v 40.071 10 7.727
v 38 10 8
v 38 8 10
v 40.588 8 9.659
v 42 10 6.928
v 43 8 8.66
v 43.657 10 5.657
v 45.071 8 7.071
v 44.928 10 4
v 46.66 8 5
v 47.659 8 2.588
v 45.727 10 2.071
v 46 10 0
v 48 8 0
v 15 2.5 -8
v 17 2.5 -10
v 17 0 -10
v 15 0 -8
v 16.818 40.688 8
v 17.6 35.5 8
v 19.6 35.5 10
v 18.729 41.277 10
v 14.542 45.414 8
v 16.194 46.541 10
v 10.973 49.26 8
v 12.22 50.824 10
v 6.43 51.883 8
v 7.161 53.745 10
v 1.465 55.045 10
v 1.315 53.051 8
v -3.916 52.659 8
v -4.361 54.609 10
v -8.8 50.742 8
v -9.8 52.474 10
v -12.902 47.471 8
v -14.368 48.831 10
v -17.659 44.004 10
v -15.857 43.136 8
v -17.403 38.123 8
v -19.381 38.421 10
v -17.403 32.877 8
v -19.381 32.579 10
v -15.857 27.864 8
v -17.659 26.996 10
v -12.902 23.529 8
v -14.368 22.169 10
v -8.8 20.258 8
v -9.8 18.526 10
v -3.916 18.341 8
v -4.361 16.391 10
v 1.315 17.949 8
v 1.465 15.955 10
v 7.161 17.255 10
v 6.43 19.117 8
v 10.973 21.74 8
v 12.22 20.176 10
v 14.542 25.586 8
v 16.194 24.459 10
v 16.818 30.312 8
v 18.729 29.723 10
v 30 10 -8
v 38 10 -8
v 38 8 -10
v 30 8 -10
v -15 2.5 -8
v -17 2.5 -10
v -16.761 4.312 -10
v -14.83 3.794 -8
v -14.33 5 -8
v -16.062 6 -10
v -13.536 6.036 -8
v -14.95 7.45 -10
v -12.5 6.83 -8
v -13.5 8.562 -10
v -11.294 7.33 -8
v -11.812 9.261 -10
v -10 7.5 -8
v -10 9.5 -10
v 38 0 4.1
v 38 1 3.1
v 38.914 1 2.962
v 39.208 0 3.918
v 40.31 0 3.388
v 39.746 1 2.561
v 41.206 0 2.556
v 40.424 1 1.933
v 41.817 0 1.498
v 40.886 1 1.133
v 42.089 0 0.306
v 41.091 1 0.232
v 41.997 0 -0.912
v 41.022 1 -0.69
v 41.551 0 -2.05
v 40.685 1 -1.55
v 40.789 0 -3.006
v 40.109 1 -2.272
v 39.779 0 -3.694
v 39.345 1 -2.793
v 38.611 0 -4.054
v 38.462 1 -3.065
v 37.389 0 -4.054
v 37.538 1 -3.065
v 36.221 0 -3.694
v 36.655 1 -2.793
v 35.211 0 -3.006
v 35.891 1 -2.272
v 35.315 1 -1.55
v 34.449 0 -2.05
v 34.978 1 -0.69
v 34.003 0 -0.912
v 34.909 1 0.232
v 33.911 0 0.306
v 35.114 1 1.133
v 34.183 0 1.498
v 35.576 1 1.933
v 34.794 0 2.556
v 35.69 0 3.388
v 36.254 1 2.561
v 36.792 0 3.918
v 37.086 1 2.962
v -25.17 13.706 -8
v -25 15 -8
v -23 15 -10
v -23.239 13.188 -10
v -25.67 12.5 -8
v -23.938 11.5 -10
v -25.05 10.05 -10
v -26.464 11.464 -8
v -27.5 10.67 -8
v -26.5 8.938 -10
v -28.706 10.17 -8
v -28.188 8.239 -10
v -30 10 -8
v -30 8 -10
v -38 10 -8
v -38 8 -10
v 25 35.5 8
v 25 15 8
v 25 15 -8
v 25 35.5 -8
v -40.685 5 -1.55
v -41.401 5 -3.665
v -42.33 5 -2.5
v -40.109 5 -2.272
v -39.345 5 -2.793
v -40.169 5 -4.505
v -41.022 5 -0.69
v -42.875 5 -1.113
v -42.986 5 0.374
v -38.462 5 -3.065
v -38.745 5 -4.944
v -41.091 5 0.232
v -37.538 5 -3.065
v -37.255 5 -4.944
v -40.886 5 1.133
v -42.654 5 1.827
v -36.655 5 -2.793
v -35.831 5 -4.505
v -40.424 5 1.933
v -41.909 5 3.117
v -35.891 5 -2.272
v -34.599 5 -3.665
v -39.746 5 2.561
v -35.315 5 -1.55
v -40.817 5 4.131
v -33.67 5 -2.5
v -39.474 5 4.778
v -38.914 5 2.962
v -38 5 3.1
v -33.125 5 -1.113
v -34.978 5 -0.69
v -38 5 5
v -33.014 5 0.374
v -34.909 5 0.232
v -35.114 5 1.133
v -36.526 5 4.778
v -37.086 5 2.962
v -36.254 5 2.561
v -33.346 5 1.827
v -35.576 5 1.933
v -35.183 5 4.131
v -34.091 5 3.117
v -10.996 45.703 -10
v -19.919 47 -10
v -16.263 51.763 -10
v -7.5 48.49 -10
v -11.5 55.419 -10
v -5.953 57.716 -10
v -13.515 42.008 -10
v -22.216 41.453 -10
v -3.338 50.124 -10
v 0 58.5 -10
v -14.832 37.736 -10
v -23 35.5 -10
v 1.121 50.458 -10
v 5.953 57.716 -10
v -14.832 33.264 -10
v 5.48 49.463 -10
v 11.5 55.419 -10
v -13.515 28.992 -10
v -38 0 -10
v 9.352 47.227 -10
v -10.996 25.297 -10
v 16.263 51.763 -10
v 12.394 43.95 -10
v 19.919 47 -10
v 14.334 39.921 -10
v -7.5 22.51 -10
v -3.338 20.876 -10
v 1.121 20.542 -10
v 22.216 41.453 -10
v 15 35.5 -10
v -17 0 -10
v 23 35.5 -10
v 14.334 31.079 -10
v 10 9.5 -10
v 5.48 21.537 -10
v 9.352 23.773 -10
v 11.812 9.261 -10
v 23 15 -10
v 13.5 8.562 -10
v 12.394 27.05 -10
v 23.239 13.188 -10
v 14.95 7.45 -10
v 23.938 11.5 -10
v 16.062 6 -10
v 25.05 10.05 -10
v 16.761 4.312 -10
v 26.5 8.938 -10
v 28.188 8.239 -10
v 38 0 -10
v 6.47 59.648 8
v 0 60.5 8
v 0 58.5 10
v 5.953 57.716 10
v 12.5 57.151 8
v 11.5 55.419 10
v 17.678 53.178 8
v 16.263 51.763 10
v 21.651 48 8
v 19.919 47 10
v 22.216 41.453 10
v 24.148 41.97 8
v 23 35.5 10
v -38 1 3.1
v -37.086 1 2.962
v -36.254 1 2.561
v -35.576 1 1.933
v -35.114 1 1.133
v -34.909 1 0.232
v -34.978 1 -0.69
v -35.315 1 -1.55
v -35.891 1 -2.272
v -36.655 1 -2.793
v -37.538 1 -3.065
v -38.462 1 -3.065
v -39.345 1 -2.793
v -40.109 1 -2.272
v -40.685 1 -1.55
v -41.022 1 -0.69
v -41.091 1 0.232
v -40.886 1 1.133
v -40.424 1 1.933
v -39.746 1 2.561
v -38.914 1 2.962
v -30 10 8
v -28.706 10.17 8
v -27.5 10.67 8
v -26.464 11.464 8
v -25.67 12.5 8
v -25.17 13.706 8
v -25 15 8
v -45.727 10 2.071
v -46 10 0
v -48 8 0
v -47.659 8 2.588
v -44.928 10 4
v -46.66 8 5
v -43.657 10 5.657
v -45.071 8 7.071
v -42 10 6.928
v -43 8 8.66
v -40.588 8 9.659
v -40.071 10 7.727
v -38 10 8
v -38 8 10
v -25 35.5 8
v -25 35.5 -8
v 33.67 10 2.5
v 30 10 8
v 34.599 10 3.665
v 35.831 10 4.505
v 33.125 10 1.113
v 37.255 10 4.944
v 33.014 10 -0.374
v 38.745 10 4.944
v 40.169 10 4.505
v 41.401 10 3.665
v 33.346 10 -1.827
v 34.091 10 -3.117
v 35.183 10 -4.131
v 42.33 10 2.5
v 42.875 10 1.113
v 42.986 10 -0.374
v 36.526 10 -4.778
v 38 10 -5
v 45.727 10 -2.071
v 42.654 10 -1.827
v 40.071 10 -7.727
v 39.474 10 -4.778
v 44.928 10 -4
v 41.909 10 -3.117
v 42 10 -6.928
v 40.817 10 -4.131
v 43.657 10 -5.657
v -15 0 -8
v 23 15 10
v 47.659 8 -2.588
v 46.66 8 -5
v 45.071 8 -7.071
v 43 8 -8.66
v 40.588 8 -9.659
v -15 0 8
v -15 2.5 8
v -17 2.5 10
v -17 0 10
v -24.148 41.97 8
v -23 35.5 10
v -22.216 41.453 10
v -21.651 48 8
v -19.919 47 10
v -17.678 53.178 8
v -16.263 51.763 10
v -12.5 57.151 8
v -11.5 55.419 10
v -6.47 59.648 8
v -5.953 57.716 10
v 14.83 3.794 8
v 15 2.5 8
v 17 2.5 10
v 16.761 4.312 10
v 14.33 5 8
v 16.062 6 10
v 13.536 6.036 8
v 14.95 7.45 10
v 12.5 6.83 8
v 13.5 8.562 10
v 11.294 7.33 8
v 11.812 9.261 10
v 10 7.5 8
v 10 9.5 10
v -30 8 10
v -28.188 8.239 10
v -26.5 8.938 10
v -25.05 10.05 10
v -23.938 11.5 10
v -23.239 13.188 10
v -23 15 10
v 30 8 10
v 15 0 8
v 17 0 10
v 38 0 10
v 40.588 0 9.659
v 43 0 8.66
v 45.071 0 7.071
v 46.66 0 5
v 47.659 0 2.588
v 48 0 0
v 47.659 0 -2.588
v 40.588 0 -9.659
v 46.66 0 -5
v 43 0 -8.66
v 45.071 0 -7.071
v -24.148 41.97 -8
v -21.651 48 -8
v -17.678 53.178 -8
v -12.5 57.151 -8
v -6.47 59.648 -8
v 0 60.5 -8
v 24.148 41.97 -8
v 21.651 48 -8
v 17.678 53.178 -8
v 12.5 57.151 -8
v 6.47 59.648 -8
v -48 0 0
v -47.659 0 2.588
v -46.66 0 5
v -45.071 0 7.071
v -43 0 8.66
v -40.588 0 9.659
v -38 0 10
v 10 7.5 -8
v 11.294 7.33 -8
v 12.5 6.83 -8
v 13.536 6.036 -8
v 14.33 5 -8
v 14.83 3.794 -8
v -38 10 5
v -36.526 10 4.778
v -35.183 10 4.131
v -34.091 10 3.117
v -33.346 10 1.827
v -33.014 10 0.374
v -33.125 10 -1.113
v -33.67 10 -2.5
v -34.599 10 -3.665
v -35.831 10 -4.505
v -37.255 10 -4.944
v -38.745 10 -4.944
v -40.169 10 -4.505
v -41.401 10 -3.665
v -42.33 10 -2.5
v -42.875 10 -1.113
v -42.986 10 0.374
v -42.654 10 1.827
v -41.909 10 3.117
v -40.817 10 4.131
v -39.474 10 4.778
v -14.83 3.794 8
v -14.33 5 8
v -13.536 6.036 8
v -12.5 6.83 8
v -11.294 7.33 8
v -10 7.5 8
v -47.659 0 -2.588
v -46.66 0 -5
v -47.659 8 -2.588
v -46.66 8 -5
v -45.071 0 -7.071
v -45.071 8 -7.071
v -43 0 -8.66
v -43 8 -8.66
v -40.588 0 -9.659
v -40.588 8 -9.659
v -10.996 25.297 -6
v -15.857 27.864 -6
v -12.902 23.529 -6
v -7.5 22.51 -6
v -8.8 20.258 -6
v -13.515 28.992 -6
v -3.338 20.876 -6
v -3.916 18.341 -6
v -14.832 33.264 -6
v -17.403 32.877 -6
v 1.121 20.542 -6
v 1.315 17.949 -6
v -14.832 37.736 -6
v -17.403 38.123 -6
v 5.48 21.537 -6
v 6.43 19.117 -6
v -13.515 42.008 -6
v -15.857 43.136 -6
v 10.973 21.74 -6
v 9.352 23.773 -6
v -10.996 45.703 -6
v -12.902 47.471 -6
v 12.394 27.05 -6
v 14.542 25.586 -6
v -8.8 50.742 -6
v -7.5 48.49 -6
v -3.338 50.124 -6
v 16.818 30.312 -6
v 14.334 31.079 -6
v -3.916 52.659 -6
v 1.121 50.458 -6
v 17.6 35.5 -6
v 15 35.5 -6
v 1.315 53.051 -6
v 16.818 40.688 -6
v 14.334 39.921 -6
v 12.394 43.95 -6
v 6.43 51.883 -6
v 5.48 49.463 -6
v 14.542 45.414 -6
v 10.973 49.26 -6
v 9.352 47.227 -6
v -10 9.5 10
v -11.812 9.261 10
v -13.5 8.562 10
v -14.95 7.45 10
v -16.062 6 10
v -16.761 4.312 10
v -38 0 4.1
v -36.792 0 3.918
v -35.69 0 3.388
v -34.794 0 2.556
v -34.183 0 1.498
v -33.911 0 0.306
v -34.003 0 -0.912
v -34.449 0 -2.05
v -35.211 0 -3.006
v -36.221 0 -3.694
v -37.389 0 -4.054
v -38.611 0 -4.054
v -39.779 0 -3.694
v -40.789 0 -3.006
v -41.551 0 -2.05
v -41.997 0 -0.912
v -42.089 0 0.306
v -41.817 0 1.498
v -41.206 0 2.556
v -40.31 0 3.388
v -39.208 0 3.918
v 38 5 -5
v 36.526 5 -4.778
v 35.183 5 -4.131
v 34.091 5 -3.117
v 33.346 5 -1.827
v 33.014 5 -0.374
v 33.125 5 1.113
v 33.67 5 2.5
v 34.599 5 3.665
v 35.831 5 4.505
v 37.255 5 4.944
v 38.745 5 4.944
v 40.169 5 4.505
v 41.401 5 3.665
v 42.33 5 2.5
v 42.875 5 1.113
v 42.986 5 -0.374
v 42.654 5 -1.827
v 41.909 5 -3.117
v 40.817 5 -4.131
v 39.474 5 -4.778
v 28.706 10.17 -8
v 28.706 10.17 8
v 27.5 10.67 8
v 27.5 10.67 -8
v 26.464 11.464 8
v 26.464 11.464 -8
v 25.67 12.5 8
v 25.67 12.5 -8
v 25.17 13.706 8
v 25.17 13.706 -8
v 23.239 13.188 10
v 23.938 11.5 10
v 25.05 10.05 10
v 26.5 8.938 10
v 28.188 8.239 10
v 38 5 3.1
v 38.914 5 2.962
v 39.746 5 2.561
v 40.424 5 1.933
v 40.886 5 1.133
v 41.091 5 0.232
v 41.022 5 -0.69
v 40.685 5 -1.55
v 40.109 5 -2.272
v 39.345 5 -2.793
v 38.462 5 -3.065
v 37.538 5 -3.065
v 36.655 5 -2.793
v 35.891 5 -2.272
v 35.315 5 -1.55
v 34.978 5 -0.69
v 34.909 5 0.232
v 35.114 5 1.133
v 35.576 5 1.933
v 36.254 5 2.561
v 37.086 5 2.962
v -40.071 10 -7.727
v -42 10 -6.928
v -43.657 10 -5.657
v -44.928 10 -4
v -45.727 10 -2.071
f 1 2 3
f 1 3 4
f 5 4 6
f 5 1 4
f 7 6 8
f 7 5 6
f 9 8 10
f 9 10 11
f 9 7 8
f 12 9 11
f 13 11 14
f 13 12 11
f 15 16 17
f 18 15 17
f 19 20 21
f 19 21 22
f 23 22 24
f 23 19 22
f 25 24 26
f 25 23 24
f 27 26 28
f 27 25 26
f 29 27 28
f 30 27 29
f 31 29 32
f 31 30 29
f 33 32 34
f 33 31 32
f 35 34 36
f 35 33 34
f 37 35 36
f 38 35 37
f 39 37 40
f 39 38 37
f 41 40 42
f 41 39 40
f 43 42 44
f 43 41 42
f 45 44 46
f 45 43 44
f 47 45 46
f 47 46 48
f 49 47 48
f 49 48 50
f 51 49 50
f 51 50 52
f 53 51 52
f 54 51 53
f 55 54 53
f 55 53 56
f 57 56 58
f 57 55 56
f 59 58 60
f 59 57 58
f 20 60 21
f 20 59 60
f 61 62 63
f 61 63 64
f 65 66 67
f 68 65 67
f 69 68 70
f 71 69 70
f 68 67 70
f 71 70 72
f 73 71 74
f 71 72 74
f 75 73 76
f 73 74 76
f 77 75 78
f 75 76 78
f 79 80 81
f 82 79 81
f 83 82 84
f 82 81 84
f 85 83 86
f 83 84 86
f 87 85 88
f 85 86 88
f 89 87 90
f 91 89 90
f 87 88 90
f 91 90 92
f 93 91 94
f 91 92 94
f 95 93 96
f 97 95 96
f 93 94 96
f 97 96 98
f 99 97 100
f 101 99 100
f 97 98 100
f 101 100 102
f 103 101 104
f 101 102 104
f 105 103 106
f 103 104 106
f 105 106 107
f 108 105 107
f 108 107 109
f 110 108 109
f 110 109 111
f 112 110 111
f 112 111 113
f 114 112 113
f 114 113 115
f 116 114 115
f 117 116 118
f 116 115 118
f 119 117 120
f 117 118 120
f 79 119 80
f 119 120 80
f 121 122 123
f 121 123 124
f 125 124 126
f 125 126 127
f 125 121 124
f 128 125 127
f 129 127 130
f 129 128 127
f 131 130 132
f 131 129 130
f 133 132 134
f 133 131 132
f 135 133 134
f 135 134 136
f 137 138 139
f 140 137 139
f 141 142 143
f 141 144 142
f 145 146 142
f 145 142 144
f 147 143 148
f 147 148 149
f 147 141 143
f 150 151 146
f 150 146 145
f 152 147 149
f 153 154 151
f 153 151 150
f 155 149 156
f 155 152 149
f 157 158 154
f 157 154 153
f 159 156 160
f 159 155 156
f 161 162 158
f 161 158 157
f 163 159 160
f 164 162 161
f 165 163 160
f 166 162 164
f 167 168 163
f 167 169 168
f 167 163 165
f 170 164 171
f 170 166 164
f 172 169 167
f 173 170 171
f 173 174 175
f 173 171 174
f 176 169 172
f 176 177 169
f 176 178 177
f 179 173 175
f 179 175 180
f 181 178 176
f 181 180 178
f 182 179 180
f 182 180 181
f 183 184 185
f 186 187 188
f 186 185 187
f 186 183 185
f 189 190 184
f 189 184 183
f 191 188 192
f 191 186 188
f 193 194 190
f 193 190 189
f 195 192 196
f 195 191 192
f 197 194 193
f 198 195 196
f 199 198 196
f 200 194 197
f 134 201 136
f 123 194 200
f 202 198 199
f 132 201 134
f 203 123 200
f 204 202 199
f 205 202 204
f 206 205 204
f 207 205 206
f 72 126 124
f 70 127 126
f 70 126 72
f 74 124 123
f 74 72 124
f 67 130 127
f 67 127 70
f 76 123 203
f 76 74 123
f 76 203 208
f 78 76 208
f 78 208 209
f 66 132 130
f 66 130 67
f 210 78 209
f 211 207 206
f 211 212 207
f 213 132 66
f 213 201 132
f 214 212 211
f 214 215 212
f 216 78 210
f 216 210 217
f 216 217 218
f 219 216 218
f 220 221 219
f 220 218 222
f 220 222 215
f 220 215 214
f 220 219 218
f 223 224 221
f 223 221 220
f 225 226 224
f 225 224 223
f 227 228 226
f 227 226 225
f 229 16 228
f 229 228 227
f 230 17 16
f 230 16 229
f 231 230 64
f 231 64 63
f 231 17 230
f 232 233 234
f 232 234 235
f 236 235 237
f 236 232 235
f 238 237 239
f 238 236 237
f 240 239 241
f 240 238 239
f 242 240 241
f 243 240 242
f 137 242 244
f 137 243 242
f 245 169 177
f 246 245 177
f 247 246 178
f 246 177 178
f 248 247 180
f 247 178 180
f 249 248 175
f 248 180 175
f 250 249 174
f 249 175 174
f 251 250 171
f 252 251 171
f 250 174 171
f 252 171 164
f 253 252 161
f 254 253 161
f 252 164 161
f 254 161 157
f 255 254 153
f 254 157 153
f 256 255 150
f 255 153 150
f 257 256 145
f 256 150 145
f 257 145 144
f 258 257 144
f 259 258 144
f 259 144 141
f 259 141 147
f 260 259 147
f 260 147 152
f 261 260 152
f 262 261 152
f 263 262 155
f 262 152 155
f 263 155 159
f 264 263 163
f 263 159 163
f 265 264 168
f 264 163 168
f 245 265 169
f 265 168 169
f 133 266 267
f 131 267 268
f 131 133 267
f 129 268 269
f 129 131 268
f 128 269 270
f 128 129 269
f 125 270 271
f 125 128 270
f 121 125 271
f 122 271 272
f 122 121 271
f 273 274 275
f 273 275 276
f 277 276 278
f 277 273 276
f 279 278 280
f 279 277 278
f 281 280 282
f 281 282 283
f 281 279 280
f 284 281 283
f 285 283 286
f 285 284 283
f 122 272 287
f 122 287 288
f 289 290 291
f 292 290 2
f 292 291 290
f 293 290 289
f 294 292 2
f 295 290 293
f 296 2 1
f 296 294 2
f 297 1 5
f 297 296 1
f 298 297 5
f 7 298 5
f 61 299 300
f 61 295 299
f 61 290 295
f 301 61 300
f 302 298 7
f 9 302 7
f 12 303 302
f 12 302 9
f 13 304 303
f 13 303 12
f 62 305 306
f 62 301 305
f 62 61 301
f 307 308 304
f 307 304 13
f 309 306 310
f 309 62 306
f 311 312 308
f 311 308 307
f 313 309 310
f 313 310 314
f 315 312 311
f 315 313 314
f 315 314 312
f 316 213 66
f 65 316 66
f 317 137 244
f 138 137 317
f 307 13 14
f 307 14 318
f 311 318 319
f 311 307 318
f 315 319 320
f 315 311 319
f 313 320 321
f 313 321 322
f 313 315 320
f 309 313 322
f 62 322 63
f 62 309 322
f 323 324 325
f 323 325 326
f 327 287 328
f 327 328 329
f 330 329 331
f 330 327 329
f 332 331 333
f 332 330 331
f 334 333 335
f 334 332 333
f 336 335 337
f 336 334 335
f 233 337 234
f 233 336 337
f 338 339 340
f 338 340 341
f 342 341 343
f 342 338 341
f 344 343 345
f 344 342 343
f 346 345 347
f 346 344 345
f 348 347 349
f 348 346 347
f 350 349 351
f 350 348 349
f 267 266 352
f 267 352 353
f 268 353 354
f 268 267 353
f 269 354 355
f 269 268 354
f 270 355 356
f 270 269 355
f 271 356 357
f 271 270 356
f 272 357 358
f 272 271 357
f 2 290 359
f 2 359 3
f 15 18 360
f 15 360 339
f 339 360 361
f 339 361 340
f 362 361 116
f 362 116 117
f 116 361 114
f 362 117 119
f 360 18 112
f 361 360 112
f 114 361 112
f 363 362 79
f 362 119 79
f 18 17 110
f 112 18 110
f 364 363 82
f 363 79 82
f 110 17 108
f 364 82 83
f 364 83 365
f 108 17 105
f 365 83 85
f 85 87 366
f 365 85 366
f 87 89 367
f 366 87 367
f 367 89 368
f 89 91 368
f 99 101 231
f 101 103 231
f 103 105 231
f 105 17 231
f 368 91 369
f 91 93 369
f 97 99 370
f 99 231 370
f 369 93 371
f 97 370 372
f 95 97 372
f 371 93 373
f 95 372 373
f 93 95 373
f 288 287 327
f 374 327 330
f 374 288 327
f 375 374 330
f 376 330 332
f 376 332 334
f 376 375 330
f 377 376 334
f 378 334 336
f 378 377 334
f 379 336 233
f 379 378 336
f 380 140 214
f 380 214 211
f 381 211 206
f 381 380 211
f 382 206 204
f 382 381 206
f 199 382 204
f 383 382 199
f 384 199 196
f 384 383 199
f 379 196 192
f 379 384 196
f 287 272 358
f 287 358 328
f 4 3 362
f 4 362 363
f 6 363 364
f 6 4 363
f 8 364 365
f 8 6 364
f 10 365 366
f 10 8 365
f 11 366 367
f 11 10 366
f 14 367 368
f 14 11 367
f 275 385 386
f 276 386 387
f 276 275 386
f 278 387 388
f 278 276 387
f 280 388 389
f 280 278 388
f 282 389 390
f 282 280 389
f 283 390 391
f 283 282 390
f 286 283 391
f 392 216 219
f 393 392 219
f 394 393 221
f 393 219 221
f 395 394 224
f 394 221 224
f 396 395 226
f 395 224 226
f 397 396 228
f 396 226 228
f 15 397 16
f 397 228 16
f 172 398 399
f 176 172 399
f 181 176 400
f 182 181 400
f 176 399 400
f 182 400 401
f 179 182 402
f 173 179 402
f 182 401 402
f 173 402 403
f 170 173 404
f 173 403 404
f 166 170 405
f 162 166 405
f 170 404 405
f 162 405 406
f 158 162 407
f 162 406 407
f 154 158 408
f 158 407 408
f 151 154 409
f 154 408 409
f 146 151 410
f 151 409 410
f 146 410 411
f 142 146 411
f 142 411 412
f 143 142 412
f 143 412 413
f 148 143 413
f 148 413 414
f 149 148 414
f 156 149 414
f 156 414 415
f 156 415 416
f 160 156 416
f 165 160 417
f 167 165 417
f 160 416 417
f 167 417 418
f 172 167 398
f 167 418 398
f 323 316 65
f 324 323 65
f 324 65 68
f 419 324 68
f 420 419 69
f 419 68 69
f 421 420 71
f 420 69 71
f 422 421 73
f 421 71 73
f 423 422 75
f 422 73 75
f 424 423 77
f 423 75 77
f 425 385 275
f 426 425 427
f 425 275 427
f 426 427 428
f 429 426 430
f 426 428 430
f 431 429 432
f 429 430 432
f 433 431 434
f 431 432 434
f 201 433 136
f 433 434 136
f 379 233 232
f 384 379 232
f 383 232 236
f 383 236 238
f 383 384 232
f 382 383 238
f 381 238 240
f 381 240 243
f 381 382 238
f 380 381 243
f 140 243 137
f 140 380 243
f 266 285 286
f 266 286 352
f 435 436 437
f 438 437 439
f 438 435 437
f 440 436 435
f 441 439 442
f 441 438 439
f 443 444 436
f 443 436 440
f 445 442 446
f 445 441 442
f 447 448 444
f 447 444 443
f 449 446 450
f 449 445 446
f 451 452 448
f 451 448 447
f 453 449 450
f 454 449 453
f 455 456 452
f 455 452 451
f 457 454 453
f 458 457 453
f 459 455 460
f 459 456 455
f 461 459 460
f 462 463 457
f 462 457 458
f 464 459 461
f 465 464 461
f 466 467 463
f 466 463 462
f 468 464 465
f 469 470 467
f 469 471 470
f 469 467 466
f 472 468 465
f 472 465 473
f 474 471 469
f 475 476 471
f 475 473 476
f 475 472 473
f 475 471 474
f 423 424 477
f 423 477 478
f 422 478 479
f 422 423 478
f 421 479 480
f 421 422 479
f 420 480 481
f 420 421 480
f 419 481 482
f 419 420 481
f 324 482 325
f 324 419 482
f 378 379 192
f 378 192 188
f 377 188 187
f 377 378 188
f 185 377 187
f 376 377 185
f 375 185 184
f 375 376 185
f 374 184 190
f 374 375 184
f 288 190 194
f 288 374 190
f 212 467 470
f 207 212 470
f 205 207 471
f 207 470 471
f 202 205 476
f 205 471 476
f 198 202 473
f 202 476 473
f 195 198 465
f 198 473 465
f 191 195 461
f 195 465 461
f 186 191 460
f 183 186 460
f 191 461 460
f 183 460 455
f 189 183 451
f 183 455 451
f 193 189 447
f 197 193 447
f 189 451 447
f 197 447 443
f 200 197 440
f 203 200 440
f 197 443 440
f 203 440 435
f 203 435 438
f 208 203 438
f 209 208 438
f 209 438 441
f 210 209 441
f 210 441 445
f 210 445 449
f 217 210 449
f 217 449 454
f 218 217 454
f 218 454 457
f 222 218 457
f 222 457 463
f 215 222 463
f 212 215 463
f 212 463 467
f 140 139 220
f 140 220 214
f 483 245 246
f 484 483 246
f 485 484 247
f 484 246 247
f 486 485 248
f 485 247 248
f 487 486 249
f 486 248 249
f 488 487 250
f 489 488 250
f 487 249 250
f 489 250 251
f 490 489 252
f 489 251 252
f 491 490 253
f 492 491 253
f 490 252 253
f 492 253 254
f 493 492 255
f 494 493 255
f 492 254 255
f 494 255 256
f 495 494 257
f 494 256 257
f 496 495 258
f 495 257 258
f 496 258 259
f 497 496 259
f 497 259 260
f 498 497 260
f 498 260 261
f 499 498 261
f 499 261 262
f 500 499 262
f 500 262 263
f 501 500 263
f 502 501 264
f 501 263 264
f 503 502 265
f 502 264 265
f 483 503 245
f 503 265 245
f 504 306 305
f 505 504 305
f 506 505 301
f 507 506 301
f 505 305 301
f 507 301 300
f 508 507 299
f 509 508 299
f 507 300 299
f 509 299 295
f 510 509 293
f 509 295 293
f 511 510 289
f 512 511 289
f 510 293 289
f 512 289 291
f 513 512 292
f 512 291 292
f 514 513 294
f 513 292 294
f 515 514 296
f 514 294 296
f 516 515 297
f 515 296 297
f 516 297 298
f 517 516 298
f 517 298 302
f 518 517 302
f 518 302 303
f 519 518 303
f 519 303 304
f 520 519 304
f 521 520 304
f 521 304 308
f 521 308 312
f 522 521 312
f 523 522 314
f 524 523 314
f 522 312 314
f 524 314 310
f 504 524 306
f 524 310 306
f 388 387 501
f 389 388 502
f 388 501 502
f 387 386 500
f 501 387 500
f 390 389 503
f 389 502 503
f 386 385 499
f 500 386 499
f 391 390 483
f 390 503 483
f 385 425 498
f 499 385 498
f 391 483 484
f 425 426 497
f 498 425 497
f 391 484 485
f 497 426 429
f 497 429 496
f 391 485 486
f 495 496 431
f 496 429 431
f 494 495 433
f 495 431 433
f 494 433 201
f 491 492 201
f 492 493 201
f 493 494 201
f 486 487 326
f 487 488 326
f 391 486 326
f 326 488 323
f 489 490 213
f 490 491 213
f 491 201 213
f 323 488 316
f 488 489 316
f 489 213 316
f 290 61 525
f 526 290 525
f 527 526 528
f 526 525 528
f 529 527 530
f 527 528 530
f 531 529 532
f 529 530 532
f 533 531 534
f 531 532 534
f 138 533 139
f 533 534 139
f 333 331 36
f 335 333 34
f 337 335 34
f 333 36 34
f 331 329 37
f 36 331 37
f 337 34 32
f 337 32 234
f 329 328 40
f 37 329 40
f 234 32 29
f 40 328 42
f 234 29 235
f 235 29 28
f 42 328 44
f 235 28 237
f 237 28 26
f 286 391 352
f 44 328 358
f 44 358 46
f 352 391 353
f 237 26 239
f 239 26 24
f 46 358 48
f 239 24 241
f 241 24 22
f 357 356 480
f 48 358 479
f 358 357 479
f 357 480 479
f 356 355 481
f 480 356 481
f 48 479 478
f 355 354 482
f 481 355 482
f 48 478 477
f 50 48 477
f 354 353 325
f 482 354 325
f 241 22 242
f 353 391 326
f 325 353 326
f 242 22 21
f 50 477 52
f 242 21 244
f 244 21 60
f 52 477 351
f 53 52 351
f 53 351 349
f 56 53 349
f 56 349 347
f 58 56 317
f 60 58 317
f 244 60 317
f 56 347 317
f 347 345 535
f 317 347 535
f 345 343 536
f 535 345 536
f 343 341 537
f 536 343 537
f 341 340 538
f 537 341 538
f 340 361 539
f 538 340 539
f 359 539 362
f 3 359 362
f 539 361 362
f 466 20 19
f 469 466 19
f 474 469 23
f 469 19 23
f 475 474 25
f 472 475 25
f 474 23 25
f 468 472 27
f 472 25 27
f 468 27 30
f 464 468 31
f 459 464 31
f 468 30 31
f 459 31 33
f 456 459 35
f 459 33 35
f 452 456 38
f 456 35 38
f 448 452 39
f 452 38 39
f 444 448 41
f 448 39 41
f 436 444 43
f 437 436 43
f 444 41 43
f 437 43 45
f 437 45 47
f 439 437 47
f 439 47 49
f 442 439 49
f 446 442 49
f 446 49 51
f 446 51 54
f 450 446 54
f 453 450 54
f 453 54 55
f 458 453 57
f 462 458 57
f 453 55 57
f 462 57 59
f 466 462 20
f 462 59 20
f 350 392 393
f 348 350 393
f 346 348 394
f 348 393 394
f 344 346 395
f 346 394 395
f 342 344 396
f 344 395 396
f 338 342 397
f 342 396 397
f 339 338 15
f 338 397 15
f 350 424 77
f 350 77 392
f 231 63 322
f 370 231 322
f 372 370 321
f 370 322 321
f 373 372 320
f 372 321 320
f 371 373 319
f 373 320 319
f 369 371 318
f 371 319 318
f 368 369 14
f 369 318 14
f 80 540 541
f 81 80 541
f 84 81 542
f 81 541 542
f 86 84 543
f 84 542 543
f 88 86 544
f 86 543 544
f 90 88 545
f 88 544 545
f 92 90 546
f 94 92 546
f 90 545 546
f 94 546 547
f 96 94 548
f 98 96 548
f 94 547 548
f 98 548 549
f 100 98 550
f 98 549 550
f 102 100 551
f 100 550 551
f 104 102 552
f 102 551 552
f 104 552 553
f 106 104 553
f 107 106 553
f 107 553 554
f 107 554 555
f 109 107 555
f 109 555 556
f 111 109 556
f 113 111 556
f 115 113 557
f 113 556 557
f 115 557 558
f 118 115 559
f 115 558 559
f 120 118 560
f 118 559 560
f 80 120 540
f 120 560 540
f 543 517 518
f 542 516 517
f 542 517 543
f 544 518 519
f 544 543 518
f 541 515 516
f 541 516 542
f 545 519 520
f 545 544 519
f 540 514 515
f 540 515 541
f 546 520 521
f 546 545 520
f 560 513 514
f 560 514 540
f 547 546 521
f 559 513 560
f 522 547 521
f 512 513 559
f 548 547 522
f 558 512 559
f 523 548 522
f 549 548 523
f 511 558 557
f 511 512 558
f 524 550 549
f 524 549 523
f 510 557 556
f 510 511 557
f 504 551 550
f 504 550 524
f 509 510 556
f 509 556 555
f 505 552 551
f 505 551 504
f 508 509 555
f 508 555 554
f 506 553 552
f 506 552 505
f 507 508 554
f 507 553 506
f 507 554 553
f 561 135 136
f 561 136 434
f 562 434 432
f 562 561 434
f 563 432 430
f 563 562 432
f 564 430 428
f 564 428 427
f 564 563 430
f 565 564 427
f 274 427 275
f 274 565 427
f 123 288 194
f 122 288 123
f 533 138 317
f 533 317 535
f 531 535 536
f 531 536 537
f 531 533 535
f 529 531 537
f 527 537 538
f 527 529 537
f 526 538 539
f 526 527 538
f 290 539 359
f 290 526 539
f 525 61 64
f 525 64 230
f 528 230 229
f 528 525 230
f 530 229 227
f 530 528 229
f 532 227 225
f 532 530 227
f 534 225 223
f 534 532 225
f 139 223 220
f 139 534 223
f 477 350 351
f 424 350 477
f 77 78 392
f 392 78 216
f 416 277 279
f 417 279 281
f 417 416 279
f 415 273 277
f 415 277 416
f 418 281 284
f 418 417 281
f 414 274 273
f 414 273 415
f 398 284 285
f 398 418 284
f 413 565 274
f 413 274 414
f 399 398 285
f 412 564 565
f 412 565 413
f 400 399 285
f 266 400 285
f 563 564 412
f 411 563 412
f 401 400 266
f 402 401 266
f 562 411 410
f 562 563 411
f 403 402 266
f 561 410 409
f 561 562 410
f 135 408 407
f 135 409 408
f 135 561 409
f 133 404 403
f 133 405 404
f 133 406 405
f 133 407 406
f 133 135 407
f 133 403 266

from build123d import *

# Parameters (mm, degrees)
SKETCH_1_W          = 96
SKETCH_1_H          = 20
EXTRUDE_1_DEPTH     = 10
SKETCH_2_R          = 5
CUT_EXTRUDE_1_DEPTH = 5
FILLET_1_R          = 10
SKETCH_3_R          = 3.1
CUT_EXTRUDE_2_DEPTH = 5
CHAMFER_1_SIZE      = 1
SKETCH_4_W          = 50
SKETCH_4_H          = 20
EXTRUDE_2_DEPTH     = 50.5
CUT_EXTRUDE_START   = -20
CUT_EXTRUDE_4_DEPTH = 20
SKETCH_7_R          = 17.6
CUT_EXTRUDE_5_DEPTH = 16
SKETCH_8_R          = 15
CUT_EXTRUDE_6_DEPTH = 16
CHAMFER_3_SIZE      = 2
FILLET_3_R          = 5
CHAMFER_5_SIZE      = 2
SKETCH_9_W          = 30
SKETCH_9_H          = 15
CUT_EXTRUDE_7_DEPTH = 80.776249598
FILLET_4_R          = 5
CHAMFER_6_SIZE      = 2


# Read off the part's stored shape, not the designer's step: 切除-拉伸4
with BuildPart() as part:
    # 草图1 → 凸台-拉伸1 (new body)
    with BuildSketch(Plane(origin=(0, 0, 0), x_dir=(1, 0, 0), z_dir=(0, 1, 0))):
        Rectangle(SKETCH_1_W, SKETCH_1_H)
    extrude(amount=EXTRUDE_1_DEPTH)

    # 草图2 → 切除-拉伸1 (cut)
    with BuildSketch(Plane(origin=(0, 10, 0), x_dir=(1, 0, 0), z_dir=(0, 1, 0))):
        with Locations(Location((-38, 0, 0), (0, 0, 270))):
            Circle(SKETCH_2_R)
        with Locations(Location((38, 0, 0), (0, 0, 90))):
            Circle(SKETCH_2_R)
    extrude(amount=-CUT_EXTRUDE_1_DEPTH, mode=Mode.SUBTRACT)

    # 圆角1
    fillet_1_edges = [part.edges().sort_by_distance(p)[0] for p in [
        (48, 5, -10),
        (48, 5, 10),
        (-48, 5, 10),
        (-48, 5, -10),
    ]]
    fillet(fillet_1_edges, radius=FILLET_1_R - 0.0001)  # a hair under: the kernel refuses the full size

    # 草图3 → 切除-拉伸2 (cut)
    with BuildSketch(Plane(origin=(0, 5, 0), x_dir=(1, 0, 0), z_dir=(0, 1, 0))):
        with Locations(Location((-38, 0, 0), (0, 0, 270))):
            Circle(SKETCH_3_R)
        with Locations(Location((38, 0, 0), (0, 0, 270))):
            Circle(SKETCH_3_R)
    extrude(amount=-CUT_EXTRUDE_2_DEPTH, mode=Mode.SUBTRACT)

    # 倒角1
    chamfer_1_edges = [part.edges().sort_by_distance(p)[0] for p in [
        (-38, 0, -3.1),
        (38, 0, -3.1),
    ]]
    chamfer(chamfer_1_edges, length=CHAMFER_1_SIZE)

    # 草图4 → 凸台-拉伸2 (add)
    with BuildSketch(Plane(origin=(0, 10, 0), x_dir=(1, 0, 0), z_dir=(0, 1, 0))):
        Rectangle(SKETCH_4_W, SKETCH_4_H)
    extrude(amount=EXTRUDE_2_DEPTH)

    # 切除-拉伸4 outline → 切除-拉伸4 (cut)
    with BuildSketch(Plane.XY.offset(10).offset(CUT_EXTRUDE_START)):
        with BuildLine():
            Line((-25, 60.5), (-25, 35.5))
            ThreePointArc((-25, 35.5), (-17.677669559, 53.1776695), (-8.4e-08, 60.5))
            Line((-8.4e-08, 60.5), (-25, 60.5))
        make_face()
        with BuildLine():
            Line((25, 60.5), (-8.4e-08, 60.5))
            ThreePointArc((-8.4e-08, 60.5), (17.6776695, 53.177669559), (25, 35.5))
            Line((25, 35.5), (25, 60.5))
        make_face()
    extrude(amount=CUT_EXTRUDE_4_DEPTH, mode=Mode.SUBTRACT)

    # 草图7 → 切除-拉伸5 (cut)
    with BuildSketch(Plane.XY.offset(10)):
        with Locations((0, 35.5)):
            Circle(SKETCH_7_R)
    extrude(amount=-CUT_EXTRUDE_5_DEPTH, mode=Mode.SUBTRACT)

    # 草图8 → 切除-拉伸6 (cut)
    with BuildSketch(Plane.XY.offset(-6)):
        with Locations((0, 35.5)):
            Circle(SKETCH_8_R)
    extrude(amount=-CUT_EXTRUDE_6_DEPTH, mode=Mode.SUBTRACT)

    # 倒角3
    chamfer_3_edges = [part.edges().sort_by_distance(p)[0] for p in [
        (-17.6, 35.5, 10),
    ]]
    chamfer(chamfer_3_edges, length=CHAMFER_3_SIZE)

    # 圆角3
    fillet_3_edges = [part.edges().sort_by_distance(p)[0] for p in [
        (25, 10, 0),
        (-25, 10, 0),
    ]]
    fillet(fillet_3_edges, radius=FILLET_3_R)

    # 倒角5
    chamfer_5_edges = [part.edges().sort_by_distance(p)[0] for p in [
        (34.00005, 10, 10),
        (34.00005, 10, -10),
        (26.464466094, 11.464466094, -10),
        (26.464466094, 11.464466094, 10),
        (-26.464466094, 11.464466094, 10),
        (-26.464466094, 11.464466094, -10),
        (-34.00005, 10, -10),
        (-34.00005, 10, 10),
        (-45.071097101, 10, -7.071097101),
        (-45.071097101, 10, 7.071097101),
        (45.071097101, 10, 7.071097101),
        (45.071097101, 10, -7.071097101),
        (-25, 25.25, 10),
        (-25, 25.25, -10),
        (25, 25.25, -10),
        (25, 25.25, 10),
        (17.6776695, 53.177669559, -10),
        (17.6776695, 53.177669559, 10),
    ]]
    chamfer(chamfer_5_edges, length=CHAMFER_5_SIZE)

    # 草图9 → 切除-拉伸7 (cut, through all)
    with BuildSketch(Plane.XY.offset(10)):
        Rectangle(SKETCH_9_W, SKETCH_9_H)
    extrude(amount=-CUT_EXTRUDE_7_DEPTH, mode=Mode.SUBTRACT)

    # 圆角4
    fillet_4_edges = [part.edges().sort_by_distance(p)[0] for p in [
        (15, 7.5, 0),
        (-15, 7.5, 0),
    ]]
    fillet(fillet_4_edges, radius=FILLET_4_R)

    # 倒角6
    chamfer_6_edges = [part.edges().sort_by_distance(p)[0] for p in [
        (15, 1.25, -10),
        (15, 1.25, 10),
        (0, 7.5, 10),
        (0, 7.5, -10),
        (-15, 1.25, -10),
        (-15, 1.25, 10),
        (13.535533906, 6.035533906, 10),
        (13.535533906, 6.035533906, -10),
        (-13.535533906, 6.035533906, 10),
        (-13.535533906, 6.035533906, -10),
    ]]
    chamfer(chamfer_6_edges, length=CHAMFER_6_SIZE)


solid = part.part
